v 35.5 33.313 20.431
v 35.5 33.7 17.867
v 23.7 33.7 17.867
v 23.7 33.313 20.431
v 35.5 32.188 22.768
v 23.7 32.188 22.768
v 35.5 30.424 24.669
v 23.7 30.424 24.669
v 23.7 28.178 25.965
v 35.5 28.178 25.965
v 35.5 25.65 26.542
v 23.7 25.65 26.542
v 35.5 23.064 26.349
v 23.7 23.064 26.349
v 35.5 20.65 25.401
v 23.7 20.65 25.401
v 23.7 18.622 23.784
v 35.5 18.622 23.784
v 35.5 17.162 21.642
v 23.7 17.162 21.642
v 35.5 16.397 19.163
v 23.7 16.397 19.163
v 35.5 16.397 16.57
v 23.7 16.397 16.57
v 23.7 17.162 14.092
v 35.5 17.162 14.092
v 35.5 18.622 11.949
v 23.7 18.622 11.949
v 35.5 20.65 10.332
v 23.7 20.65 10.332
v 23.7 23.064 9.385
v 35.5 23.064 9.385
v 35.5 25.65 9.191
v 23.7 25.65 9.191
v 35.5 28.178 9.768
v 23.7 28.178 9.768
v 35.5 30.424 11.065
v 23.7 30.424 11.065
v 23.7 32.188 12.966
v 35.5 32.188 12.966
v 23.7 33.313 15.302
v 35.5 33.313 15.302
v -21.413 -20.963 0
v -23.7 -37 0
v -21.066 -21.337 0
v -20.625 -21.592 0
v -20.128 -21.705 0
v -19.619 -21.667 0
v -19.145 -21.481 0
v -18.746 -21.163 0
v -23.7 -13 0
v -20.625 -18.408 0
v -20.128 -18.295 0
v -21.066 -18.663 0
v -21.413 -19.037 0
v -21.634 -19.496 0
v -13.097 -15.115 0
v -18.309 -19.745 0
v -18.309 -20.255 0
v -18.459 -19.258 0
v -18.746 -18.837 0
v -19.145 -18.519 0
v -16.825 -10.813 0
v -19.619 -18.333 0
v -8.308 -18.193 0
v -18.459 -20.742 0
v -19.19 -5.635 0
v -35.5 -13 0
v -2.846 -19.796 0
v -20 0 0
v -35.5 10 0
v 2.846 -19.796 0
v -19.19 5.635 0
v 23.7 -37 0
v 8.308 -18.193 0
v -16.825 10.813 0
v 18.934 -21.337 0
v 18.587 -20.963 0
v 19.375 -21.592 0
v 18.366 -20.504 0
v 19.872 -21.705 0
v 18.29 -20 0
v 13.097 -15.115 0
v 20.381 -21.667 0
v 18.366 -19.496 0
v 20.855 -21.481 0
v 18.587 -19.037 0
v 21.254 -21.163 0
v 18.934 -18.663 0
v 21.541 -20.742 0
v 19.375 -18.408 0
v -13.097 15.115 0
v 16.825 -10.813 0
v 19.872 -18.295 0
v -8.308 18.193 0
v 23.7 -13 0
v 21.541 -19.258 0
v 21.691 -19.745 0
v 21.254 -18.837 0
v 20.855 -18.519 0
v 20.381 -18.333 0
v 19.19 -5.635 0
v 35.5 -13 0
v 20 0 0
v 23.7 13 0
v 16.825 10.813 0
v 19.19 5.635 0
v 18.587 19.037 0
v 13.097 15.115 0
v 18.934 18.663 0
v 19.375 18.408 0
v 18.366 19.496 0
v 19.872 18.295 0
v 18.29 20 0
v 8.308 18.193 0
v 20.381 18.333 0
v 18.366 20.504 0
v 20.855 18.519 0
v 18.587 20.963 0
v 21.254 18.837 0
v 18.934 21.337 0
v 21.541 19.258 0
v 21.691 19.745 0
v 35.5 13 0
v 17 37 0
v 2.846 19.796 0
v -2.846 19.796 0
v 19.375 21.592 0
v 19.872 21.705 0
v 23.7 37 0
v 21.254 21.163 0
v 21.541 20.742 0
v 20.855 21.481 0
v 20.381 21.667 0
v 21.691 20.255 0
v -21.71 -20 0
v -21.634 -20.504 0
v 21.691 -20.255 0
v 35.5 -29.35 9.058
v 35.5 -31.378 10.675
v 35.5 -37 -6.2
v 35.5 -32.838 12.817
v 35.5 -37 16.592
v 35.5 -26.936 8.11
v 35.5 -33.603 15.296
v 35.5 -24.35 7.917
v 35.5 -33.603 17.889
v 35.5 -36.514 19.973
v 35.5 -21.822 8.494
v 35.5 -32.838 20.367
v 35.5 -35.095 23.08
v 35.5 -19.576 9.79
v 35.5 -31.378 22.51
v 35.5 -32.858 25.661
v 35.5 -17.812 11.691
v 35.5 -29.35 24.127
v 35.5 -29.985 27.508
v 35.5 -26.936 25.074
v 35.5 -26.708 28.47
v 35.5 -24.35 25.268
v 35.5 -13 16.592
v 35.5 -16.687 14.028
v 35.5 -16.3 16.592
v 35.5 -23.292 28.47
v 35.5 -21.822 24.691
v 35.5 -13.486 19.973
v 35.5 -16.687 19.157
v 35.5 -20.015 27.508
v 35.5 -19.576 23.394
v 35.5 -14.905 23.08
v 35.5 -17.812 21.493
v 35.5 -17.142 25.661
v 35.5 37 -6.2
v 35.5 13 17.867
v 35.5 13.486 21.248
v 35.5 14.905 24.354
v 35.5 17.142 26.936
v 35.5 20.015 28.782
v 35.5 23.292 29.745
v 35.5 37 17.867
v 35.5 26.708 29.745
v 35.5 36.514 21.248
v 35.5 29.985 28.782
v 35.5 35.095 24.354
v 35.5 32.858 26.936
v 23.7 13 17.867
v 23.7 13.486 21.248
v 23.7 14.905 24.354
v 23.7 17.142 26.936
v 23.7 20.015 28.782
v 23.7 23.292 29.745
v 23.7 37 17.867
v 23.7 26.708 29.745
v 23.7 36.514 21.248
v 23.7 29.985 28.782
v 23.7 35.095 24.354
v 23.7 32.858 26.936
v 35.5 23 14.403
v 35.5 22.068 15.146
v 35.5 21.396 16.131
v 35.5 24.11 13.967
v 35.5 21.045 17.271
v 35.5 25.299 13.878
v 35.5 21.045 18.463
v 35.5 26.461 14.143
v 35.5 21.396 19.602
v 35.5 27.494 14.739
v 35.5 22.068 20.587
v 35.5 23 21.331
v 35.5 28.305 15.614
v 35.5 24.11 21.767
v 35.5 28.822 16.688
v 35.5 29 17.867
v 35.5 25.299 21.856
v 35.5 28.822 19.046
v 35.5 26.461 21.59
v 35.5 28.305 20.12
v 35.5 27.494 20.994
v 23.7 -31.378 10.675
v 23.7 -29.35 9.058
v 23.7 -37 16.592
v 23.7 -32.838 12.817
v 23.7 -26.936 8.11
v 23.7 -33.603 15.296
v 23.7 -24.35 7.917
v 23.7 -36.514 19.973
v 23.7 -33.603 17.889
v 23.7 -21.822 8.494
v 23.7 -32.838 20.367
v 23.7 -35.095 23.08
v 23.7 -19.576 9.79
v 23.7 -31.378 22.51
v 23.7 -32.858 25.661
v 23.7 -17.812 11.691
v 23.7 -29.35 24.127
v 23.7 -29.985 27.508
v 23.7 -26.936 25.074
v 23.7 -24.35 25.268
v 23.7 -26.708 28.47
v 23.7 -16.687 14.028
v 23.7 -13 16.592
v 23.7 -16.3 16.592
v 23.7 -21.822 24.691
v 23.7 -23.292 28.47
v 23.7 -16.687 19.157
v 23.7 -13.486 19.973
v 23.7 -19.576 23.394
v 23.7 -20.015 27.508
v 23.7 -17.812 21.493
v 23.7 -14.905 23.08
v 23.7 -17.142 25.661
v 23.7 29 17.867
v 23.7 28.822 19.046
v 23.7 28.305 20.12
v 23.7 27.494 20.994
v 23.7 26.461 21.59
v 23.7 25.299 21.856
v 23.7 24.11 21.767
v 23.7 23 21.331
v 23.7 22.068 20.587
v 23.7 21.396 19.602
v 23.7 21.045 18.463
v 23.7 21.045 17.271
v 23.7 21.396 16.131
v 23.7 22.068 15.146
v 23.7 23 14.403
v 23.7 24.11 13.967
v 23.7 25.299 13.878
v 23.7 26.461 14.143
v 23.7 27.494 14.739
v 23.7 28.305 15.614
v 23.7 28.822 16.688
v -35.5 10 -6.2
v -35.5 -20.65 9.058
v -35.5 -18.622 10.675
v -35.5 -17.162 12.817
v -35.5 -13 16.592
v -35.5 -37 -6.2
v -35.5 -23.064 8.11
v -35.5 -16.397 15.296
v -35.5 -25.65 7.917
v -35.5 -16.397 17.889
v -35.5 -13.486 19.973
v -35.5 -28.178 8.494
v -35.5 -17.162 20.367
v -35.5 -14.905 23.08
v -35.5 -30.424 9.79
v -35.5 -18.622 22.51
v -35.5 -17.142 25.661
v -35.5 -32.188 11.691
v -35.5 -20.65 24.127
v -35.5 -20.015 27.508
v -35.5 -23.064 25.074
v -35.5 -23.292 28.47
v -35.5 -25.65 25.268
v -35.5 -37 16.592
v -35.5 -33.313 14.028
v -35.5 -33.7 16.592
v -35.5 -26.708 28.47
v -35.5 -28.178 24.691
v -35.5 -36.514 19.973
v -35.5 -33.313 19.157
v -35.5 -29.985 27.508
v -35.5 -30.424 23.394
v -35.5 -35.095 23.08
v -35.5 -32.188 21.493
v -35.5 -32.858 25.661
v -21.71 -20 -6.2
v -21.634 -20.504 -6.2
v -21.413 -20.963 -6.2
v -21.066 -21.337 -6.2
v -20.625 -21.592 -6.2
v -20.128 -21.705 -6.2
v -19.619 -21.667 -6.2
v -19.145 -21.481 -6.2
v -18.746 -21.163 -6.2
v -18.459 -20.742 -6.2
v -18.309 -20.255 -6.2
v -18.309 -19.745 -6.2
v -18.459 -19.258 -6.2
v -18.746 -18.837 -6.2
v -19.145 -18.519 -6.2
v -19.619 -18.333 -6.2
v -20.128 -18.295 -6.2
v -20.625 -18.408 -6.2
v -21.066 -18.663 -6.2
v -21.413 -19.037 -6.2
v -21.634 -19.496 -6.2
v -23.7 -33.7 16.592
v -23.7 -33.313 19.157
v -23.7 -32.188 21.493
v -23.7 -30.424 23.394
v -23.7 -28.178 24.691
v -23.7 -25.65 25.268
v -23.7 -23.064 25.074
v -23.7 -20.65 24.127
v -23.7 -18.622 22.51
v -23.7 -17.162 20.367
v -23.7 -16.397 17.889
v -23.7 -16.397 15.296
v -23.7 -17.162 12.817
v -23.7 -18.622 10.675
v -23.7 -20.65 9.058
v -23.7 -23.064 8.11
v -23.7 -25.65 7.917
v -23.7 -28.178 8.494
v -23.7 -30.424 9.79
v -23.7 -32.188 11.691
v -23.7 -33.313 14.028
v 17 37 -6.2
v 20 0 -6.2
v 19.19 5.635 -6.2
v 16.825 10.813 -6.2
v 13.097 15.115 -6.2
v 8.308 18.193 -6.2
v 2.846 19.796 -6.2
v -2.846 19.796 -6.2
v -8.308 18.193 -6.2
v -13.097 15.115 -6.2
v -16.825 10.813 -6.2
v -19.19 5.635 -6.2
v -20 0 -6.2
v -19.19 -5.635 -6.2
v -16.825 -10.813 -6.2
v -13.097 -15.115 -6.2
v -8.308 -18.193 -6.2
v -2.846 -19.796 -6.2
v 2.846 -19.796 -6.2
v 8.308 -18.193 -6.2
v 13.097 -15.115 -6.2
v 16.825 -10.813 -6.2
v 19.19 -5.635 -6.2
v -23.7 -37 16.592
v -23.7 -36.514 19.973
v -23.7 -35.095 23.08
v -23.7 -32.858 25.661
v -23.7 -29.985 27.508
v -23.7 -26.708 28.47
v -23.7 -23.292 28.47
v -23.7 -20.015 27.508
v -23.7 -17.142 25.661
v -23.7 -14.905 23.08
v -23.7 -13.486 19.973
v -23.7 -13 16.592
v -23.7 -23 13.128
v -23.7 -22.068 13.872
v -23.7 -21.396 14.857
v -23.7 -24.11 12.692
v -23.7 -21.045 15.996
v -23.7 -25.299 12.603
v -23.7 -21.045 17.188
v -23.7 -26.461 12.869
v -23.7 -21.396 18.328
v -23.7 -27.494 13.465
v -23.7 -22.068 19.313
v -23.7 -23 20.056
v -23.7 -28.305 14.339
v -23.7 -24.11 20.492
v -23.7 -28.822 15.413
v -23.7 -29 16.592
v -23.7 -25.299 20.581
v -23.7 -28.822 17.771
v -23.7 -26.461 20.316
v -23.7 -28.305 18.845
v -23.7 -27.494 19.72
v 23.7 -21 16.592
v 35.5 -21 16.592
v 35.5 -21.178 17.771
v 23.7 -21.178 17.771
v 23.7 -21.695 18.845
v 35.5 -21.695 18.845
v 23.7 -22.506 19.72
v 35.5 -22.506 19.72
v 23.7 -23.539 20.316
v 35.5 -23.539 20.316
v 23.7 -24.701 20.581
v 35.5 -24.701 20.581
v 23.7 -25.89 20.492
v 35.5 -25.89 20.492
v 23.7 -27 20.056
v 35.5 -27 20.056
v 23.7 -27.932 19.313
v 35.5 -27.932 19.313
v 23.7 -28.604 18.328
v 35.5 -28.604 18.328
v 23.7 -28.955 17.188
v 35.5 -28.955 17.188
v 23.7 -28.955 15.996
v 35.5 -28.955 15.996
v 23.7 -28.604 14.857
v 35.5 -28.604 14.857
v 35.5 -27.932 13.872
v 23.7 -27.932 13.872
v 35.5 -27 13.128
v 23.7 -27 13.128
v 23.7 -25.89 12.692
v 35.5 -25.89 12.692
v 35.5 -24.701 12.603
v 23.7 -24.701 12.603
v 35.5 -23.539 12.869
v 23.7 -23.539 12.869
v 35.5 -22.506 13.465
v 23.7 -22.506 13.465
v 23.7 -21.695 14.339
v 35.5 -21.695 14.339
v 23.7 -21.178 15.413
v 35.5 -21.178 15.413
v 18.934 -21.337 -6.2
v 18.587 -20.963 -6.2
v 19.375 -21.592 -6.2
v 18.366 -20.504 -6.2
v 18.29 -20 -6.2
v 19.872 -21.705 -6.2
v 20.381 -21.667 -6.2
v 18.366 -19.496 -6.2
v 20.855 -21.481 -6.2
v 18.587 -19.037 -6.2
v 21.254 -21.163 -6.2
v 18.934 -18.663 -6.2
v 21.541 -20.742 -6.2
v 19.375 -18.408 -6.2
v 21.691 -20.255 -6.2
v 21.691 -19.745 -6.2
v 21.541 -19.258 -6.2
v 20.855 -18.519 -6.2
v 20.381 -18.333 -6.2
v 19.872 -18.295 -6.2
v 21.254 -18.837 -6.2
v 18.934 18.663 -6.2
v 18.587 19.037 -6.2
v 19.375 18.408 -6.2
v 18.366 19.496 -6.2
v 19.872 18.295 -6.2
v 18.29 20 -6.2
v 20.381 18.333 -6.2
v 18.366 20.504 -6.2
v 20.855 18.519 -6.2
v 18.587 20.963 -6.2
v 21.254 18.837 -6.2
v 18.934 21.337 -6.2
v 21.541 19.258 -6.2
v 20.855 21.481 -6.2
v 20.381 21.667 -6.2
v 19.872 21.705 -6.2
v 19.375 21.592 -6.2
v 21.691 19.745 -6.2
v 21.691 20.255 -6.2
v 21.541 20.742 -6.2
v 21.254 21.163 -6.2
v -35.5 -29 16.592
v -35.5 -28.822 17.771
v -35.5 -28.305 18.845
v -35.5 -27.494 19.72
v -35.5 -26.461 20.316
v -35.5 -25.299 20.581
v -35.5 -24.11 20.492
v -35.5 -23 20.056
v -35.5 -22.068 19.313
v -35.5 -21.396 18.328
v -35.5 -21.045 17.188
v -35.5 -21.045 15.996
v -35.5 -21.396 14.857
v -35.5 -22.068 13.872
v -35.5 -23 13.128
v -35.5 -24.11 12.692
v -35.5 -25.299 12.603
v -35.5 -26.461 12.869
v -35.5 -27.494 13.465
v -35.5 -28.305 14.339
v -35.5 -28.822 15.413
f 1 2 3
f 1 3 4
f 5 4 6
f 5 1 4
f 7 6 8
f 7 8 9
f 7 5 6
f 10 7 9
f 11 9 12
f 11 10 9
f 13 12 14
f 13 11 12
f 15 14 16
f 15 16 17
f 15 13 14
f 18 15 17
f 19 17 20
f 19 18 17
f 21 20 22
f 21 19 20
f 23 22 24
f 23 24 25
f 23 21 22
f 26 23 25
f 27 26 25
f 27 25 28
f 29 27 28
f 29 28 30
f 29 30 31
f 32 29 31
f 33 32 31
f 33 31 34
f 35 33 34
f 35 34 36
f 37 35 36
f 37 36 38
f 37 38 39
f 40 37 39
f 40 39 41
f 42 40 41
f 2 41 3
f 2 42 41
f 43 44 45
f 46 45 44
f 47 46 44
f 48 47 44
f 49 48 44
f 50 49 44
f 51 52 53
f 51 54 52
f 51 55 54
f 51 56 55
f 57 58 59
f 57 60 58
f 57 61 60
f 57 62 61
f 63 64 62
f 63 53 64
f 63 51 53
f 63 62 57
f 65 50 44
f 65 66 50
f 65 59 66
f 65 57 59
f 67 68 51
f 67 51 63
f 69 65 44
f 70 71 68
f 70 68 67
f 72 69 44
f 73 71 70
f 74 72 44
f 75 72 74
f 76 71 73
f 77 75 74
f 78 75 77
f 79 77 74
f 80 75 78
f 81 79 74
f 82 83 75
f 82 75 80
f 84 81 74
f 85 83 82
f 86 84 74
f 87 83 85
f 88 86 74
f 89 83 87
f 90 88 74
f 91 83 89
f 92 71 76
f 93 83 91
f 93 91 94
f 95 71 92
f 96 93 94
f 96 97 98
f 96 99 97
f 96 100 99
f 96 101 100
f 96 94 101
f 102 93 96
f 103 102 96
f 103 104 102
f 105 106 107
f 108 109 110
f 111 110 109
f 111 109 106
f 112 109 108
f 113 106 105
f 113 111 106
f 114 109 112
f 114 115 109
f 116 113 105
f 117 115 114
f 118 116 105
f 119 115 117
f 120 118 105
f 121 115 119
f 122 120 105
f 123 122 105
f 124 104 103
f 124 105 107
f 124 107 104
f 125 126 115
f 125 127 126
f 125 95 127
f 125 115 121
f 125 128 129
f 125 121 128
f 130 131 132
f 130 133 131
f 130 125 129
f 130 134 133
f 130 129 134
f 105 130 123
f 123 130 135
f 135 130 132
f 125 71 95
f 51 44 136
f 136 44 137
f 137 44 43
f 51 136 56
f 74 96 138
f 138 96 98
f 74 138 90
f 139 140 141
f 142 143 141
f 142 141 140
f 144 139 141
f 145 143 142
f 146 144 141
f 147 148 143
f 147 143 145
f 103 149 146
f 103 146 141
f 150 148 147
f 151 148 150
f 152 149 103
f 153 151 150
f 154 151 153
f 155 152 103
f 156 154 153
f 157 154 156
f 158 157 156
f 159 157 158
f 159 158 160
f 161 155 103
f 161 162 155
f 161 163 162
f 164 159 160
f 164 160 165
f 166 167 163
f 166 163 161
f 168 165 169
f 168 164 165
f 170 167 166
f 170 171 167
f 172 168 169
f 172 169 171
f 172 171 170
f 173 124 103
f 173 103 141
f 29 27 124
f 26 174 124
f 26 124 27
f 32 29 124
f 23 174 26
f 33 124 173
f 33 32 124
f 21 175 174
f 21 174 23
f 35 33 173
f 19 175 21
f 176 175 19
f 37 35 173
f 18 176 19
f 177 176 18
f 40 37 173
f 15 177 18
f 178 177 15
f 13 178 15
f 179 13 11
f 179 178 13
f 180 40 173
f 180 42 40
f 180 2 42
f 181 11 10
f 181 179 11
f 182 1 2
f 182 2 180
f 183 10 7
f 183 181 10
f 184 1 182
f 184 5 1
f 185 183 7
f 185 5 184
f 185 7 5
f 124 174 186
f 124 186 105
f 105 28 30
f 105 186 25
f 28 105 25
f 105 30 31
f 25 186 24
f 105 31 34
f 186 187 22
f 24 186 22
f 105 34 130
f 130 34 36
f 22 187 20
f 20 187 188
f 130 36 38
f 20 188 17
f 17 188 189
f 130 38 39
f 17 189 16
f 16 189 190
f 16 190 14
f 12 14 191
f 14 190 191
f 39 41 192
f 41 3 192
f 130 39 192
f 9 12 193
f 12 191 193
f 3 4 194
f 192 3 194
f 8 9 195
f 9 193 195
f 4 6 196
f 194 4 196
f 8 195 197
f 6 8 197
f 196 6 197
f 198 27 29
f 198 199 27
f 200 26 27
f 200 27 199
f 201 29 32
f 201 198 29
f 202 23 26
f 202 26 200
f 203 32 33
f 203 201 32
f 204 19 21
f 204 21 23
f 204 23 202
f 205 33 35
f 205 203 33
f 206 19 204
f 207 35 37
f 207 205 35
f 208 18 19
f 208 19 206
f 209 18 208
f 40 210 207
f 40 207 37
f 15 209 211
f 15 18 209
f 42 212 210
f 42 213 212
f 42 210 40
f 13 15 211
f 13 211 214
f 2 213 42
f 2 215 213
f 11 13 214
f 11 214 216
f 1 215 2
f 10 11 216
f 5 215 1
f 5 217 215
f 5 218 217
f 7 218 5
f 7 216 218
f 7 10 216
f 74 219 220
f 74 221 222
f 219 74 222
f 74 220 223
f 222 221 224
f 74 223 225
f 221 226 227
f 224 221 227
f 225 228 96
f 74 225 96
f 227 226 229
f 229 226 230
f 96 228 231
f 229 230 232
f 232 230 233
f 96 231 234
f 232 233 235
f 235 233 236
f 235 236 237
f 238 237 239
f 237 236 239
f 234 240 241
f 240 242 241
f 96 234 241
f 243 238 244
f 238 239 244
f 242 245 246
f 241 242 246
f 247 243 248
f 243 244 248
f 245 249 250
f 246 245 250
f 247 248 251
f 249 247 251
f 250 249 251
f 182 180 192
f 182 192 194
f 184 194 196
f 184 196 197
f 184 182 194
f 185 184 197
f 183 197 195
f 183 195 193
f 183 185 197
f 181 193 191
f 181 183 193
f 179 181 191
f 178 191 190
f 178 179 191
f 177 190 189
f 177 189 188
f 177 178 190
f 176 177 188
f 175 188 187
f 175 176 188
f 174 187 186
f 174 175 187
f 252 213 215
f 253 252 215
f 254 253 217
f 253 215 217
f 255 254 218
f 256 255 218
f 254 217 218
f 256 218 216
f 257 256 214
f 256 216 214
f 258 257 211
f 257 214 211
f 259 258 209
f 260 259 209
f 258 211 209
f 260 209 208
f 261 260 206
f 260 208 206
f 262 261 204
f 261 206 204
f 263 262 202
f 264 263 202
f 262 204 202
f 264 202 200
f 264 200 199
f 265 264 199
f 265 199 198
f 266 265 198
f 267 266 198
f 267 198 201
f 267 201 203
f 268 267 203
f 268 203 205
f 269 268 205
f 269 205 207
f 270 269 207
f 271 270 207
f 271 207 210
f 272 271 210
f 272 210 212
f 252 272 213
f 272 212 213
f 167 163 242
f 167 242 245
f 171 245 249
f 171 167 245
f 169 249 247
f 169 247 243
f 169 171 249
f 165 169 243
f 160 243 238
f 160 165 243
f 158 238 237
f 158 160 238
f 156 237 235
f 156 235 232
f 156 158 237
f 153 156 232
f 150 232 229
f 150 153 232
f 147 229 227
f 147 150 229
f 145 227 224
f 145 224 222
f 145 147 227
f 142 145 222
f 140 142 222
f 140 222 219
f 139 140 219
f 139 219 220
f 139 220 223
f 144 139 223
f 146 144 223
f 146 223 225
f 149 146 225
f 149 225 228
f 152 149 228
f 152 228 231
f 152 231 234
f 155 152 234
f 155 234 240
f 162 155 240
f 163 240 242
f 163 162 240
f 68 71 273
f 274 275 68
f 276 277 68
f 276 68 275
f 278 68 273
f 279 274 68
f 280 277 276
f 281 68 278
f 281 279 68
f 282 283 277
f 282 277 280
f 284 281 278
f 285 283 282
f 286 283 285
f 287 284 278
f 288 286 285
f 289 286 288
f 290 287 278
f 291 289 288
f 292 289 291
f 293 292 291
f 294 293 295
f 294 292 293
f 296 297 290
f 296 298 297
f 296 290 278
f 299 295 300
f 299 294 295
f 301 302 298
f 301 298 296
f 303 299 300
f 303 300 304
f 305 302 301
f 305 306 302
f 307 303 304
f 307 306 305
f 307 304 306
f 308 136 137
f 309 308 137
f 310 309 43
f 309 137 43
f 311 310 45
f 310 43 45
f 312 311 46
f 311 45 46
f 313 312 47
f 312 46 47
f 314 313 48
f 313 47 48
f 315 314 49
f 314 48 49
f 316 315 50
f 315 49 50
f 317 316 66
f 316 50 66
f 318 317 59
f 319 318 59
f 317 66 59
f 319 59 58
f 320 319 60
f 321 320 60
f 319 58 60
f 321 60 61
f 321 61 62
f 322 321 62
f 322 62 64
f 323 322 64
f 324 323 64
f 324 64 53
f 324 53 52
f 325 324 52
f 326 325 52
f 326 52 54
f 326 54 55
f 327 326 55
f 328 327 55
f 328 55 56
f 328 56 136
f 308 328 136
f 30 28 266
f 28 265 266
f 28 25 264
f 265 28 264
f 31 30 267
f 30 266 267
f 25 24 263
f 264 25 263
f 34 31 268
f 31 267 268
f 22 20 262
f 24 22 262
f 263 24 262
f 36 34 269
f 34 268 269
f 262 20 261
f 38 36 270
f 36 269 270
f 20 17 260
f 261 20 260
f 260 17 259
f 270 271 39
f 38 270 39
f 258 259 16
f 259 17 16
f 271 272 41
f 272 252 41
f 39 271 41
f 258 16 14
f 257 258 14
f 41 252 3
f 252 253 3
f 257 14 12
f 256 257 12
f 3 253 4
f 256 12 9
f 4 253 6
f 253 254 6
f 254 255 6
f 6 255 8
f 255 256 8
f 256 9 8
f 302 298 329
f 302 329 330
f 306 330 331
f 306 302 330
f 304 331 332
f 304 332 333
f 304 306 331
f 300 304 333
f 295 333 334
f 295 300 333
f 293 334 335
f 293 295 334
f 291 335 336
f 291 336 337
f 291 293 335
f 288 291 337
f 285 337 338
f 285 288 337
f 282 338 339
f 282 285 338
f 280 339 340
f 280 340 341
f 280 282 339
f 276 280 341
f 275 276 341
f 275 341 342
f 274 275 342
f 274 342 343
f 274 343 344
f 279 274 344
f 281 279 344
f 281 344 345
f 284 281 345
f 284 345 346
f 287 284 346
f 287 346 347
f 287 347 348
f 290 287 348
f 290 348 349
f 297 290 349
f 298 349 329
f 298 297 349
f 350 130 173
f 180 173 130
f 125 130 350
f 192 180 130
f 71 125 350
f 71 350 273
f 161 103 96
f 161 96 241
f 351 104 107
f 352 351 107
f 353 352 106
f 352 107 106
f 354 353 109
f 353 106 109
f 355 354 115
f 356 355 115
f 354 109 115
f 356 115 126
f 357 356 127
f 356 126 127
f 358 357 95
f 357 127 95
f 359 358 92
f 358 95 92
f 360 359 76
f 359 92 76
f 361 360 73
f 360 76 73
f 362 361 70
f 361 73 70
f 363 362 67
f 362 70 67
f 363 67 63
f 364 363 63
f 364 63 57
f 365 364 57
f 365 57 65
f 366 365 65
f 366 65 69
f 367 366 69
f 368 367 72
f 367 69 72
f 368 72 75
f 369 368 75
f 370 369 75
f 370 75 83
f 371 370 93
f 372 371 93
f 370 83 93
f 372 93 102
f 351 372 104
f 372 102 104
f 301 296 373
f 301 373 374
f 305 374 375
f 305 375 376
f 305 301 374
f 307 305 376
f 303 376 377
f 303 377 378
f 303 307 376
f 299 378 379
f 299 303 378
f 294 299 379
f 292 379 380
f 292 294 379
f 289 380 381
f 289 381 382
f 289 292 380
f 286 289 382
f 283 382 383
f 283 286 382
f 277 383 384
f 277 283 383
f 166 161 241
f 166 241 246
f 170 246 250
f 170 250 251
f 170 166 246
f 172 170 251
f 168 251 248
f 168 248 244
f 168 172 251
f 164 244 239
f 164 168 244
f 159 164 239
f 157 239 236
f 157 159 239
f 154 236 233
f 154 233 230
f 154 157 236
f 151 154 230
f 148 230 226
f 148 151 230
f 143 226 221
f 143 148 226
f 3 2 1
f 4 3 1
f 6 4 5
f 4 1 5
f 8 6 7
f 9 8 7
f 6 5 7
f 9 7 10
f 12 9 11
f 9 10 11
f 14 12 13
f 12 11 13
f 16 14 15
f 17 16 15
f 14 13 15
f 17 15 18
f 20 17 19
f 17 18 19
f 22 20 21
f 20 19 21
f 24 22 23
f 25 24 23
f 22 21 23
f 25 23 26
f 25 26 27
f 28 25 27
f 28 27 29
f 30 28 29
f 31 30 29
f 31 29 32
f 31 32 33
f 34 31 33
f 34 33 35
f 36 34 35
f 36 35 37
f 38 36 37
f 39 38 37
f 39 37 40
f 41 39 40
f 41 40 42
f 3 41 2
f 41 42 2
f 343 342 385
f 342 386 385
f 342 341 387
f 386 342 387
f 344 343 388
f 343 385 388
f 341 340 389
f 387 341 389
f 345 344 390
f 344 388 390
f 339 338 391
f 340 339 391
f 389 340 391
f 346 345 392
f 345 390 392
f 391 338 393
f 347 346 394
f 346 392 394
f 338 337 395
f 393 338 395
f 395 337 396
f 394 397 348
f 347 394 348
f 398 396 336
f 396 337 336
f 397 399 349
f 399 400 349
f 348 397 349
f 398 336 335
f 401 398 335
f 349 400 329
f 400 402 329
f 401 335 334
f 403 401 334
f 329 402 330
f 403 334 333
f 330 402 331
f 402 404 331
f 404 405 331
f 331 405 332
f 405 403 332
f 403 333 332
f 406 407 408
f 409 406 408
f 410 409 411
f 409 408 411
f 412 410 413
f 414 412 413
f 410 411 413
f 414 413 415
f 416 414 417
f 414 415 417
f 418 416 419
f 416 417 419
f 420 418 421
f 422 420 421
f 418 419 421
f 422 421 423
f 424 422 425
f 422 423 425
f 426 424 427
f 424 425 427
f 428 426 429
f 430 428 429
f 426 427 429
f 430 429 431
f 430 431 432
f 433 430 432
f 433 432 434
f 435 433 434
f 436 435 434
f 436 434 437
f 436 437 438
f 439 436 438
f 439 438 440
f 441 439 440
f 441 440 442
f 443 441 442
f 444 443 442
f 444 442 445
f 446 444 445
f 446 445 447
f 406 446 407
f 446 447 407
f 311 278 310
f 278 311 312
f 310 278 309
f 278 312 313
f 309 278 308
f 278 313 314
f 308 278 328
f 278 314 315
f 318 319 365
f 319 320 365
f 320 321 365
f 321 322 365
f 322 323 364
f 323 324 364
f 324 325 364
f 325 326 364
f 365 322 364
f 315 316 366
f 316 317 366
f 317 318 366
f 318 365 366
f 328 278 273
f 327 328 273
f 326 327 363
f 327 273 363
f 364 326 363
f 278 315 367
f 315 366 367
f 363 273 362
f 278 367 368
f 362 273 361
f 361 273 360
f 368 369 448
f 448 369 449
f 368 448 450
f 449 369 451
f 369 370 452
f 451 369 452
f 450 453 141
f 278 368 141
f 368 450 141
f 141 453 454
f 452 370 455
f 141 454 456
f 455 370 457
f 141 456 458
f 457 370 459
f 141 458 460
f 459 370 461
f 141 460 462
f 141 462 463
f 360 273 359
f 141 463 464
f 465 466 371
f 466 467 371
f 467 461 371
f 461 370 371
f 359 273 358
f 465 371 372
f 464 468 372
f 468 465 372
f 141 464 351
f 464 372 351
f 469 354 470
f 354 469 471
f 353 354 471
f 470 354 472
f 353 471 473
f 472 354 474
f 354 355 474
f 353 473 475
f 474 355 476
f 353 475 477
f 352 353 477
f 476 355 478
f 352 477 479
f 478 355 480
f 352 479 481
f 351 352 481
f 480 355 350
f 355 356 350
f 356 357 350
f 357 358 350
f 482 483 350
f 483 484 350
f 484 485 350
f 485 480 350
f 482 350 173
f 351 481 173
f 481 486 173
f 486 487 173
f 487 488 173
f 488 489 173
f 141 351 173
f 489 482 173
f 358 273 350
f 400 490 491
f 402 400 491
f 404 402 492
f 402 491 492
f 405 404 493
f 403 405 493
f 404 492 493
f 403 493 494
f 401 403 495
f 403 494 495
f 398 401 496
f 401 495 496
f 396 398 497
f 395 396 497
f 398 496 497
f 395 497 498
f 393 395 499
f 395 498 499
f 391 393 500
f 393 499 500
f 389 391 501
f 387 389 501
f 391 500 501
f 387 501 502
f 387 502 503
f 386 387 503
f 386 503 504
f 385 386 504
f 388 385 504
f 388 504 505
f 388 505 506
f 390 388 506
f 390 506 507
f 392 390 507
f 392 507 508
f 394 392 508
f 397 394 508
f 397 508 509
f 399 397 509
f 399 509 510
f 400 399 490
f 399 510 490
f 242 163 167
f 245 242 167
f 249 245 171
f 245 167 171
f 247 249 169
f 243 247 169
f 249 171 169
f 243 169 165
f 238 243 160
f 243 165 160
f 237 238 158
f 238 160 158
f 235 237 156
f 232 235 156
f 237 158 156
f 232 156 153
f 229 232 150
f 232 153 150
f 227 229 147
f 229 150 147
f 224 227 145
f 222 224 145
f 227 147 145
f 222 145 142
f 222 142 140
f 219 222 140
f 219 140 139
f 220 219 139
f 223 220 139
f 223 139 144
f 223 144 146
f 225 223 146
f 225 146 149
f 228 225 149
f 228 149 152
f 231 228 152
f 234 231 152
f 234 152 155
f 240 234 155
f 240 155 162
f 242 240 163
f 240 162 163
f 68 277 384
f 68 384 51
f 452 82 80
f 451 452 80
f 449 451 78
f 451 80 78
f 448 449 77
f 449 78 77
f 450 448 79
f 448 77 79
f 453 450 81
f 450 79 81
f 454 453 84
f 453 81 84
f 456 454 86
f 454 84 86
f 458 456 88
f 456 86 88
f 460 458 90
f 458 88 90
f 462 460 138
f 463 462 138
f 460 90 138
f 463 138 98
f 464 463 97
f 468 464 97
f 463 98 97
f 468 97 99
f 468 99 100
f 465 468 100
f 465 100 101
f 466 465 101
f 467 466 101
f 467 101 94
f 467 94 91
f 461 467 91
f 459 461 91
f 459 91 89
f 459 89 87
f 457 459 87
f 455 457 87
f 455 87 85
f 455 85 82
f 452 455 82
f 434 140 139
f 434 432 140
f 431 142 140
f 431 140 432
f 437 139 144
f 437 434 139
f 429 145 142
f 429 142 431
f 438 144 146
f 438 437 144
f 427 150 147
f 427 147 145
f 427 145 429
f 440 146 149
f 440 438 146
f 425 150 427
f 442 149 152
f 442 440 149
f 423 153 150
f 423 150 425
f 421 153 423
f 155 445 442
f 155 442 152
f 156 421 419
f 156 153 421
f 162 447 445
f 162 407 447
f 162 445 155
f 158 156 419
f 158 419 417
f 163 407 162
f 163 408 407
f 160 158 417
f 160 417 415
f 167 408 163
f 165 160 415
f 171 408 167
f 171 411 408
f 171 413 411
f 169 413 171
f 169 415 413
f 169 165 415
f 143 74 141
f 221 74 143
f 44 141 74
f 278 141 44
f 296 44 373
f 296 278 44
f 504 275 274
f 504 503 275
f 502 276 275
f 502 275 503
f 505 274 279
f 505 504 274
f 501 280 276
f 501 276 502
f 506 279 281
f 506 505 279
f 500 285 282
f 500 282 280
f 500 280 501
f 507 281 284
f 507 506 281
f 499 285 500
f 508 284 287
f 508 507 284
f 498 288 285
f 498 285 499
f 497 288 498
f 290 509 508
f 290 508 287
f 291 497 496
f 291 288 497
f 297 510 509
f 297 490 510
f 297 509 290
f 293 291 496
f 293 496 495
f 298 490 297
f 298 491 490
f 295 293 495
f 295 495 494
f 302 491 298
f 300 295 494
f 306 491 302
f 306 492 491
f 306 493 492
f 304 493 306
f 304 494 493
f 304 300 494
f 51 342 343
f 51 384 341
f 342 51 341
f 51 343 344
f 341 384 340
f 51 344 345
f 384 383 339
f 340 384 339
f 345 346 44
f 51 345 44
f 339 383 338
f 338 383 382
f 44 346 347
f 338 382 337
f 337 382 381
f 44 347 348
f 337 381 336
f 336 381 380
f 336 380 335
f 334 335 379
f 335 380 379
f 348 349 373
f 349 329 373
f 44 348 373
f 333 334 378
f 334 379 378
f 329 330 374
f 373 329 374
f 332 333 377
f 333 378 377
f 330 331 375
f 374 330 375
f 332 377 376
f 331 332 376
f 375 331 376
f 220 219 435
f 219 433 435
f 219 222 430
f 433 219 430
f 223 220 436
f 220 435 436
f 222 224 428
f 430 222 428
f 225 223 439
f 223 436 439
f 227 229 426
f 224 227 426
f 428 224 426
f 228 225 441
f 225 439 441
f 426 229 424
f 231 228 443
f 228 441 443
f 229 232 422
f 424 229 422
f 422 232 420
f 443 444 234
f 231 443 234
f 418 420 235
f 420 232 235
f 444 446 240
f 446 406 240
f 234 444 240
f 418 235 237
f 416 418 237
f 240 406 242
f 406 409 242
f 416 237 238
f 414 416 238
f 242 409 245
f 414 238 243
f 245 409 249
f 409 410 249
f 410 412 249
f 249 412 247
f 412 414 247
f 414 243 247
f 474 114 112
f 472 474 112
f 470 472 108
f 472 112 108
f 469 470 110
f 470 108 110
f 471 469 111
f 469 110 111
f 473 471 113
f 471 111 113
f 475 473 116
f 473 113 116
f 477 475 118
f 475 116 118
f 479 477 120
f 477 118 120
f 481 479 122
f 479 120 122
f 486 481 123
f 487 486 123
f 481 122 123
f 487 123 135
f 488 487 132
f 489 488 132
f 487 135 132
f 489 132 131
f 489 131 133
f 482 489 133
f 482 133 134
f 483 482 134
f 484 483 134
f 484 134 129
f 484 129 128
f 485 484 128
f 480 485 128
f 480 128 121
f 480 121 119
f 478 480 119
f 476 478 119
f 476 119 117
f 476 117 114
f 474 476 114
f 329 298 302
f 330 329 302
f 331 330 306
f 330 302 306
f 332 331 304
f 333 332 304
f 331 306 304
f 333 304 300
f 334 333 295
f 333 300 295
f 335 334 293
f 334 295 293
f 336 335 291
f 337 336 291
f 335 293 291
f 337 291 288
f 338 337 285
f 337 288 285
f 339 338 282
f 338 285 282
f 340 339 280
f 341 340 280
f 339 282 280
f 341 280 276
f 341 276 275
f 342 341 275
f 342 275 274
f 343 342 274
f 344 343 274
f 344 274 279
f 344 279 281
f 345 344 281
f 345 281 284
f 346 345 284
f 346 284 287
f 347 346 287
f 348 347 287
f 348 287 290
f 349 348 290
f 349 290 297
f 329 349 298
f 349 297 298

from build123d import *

# Parameters (mm, degrees)
F0_R     = 20
F1_DEPTH = 6.2
F2_R     = 8.7
F3_DEPTH = 11.8
F2_R_2   = 4
F4_DEPTH = 11.8
F5_R     = 8.7
F6_DEPTH = 11.8
F5_R_2   = 4
F7_DEPTH = 11.8
F9_D     = 3.42


with BuildPart() as f1:
    # F0 (on Top) → F1 (new body)
    with BuildSketch(Plane.XY):
        Polygon((35.5, 37), (17, 37), (-35.5, 10), (-35.5, -37), (35.5, -37), align=None)
        Circle(F0_R, mode=Mode.SUBTRACT)
    extrude(amount=-F1_DEPTH)

    # F2 (on face) → F3 (join)
    with BuildSketch(Plane.YZ.offset(35.5)):
        with BuildLine():
            Line((-37, 16.592205), (-37, 0))
            Line((-37, 0), (-13, 0))
            Line((-13, 0), (-13, 16.592205))
            ThreePointArc((-13, 16.592205), (-25, 28.592205), (-37, 16.592205))
        make_face()
        with Locations((-25, 16.592205)):
            Circle(F2_R, mode=Mode.SUBTRACT)
        with BuildLine():
            Line((13, 17.866805), (13, 0))
            Line((13, 0), (37, 0))
            Line((37, 0), (37, 17.866805))
            ThreePointArc((37, 17.866805), (25, 29.866805), (13, 17.866805))
        make_face()
        with Locations((25, 17.866805)):
            Circle(F2_R, mode=Mode.SUBTRACT)
    extrude(amount=-F3_DEPTH)

    # F5 (on face) → F6 (join)
    with BuildSketch(Plane(origin=(-35.5, 0, 0), x_dir=(0, -1, 0), z_dir=(-1, 0, 0))):
        with BuildLine():
            ThreePointArc((37, 16.592205), (25, 28.592205), (13, 16.592205))
            Line((13, 16.592205), (13, 0))
            Line((13, 0), (37, 0))
            Line((37, 0), (37, 16.592205))
        make_face()
        with Locations((25, 16.592205)):
            Circle(F5_R, mode=Mode.SUBTRACT)
    extrude(amount=-F6_DEPTH)

    # F9 (through all)
    with Locations(Plane(origin=(0, 0, -6.2), x_dir=(1, 0, 0), z_dir=(0, 0, -1))):
        with Locations((-20, 20), (20, 20), (20, -20)):
            Hole(F9_D / 2)


with BuildPart() as f4:
    # F2 (on face) → F4 (new body, through all)
    with BuildSketch(Plane.YZ.offset(35.5)):
        with Locations((-25, 16.592205)):
            Circle(F2_R)
        with Locations((-25, 16.592205)):
            Circle(F2_R_2, mode=Mode.SUBTRACT)
        with Locations((25, 17.866805)):
            Circle(F2_R)
        with Locations((25, 17.866805)):
            Circle(F2_R_2, mode=Mode.SUBTRACT)
    extrude(amount=-F4_DEPTH)


with BuildPart() as f7:
    # F5 (on face) → F7 (new body, through all)
    with BuildSketch(Plane(origin=(-35.5, 0, 0), x_dir=(0, -1, 0), z_dir=(-1, 0, 0))):
        with Locations((25, 16.592205)):
            Circle(F5_R)
        with Locations((25, 16.592205)):
            Circle(F5_R_2, mode=Mode.SUBTRACT)
    extrude(amount=-F7_DEPTH)


solid = Compound([f1.part, f4.part, f7.part])
